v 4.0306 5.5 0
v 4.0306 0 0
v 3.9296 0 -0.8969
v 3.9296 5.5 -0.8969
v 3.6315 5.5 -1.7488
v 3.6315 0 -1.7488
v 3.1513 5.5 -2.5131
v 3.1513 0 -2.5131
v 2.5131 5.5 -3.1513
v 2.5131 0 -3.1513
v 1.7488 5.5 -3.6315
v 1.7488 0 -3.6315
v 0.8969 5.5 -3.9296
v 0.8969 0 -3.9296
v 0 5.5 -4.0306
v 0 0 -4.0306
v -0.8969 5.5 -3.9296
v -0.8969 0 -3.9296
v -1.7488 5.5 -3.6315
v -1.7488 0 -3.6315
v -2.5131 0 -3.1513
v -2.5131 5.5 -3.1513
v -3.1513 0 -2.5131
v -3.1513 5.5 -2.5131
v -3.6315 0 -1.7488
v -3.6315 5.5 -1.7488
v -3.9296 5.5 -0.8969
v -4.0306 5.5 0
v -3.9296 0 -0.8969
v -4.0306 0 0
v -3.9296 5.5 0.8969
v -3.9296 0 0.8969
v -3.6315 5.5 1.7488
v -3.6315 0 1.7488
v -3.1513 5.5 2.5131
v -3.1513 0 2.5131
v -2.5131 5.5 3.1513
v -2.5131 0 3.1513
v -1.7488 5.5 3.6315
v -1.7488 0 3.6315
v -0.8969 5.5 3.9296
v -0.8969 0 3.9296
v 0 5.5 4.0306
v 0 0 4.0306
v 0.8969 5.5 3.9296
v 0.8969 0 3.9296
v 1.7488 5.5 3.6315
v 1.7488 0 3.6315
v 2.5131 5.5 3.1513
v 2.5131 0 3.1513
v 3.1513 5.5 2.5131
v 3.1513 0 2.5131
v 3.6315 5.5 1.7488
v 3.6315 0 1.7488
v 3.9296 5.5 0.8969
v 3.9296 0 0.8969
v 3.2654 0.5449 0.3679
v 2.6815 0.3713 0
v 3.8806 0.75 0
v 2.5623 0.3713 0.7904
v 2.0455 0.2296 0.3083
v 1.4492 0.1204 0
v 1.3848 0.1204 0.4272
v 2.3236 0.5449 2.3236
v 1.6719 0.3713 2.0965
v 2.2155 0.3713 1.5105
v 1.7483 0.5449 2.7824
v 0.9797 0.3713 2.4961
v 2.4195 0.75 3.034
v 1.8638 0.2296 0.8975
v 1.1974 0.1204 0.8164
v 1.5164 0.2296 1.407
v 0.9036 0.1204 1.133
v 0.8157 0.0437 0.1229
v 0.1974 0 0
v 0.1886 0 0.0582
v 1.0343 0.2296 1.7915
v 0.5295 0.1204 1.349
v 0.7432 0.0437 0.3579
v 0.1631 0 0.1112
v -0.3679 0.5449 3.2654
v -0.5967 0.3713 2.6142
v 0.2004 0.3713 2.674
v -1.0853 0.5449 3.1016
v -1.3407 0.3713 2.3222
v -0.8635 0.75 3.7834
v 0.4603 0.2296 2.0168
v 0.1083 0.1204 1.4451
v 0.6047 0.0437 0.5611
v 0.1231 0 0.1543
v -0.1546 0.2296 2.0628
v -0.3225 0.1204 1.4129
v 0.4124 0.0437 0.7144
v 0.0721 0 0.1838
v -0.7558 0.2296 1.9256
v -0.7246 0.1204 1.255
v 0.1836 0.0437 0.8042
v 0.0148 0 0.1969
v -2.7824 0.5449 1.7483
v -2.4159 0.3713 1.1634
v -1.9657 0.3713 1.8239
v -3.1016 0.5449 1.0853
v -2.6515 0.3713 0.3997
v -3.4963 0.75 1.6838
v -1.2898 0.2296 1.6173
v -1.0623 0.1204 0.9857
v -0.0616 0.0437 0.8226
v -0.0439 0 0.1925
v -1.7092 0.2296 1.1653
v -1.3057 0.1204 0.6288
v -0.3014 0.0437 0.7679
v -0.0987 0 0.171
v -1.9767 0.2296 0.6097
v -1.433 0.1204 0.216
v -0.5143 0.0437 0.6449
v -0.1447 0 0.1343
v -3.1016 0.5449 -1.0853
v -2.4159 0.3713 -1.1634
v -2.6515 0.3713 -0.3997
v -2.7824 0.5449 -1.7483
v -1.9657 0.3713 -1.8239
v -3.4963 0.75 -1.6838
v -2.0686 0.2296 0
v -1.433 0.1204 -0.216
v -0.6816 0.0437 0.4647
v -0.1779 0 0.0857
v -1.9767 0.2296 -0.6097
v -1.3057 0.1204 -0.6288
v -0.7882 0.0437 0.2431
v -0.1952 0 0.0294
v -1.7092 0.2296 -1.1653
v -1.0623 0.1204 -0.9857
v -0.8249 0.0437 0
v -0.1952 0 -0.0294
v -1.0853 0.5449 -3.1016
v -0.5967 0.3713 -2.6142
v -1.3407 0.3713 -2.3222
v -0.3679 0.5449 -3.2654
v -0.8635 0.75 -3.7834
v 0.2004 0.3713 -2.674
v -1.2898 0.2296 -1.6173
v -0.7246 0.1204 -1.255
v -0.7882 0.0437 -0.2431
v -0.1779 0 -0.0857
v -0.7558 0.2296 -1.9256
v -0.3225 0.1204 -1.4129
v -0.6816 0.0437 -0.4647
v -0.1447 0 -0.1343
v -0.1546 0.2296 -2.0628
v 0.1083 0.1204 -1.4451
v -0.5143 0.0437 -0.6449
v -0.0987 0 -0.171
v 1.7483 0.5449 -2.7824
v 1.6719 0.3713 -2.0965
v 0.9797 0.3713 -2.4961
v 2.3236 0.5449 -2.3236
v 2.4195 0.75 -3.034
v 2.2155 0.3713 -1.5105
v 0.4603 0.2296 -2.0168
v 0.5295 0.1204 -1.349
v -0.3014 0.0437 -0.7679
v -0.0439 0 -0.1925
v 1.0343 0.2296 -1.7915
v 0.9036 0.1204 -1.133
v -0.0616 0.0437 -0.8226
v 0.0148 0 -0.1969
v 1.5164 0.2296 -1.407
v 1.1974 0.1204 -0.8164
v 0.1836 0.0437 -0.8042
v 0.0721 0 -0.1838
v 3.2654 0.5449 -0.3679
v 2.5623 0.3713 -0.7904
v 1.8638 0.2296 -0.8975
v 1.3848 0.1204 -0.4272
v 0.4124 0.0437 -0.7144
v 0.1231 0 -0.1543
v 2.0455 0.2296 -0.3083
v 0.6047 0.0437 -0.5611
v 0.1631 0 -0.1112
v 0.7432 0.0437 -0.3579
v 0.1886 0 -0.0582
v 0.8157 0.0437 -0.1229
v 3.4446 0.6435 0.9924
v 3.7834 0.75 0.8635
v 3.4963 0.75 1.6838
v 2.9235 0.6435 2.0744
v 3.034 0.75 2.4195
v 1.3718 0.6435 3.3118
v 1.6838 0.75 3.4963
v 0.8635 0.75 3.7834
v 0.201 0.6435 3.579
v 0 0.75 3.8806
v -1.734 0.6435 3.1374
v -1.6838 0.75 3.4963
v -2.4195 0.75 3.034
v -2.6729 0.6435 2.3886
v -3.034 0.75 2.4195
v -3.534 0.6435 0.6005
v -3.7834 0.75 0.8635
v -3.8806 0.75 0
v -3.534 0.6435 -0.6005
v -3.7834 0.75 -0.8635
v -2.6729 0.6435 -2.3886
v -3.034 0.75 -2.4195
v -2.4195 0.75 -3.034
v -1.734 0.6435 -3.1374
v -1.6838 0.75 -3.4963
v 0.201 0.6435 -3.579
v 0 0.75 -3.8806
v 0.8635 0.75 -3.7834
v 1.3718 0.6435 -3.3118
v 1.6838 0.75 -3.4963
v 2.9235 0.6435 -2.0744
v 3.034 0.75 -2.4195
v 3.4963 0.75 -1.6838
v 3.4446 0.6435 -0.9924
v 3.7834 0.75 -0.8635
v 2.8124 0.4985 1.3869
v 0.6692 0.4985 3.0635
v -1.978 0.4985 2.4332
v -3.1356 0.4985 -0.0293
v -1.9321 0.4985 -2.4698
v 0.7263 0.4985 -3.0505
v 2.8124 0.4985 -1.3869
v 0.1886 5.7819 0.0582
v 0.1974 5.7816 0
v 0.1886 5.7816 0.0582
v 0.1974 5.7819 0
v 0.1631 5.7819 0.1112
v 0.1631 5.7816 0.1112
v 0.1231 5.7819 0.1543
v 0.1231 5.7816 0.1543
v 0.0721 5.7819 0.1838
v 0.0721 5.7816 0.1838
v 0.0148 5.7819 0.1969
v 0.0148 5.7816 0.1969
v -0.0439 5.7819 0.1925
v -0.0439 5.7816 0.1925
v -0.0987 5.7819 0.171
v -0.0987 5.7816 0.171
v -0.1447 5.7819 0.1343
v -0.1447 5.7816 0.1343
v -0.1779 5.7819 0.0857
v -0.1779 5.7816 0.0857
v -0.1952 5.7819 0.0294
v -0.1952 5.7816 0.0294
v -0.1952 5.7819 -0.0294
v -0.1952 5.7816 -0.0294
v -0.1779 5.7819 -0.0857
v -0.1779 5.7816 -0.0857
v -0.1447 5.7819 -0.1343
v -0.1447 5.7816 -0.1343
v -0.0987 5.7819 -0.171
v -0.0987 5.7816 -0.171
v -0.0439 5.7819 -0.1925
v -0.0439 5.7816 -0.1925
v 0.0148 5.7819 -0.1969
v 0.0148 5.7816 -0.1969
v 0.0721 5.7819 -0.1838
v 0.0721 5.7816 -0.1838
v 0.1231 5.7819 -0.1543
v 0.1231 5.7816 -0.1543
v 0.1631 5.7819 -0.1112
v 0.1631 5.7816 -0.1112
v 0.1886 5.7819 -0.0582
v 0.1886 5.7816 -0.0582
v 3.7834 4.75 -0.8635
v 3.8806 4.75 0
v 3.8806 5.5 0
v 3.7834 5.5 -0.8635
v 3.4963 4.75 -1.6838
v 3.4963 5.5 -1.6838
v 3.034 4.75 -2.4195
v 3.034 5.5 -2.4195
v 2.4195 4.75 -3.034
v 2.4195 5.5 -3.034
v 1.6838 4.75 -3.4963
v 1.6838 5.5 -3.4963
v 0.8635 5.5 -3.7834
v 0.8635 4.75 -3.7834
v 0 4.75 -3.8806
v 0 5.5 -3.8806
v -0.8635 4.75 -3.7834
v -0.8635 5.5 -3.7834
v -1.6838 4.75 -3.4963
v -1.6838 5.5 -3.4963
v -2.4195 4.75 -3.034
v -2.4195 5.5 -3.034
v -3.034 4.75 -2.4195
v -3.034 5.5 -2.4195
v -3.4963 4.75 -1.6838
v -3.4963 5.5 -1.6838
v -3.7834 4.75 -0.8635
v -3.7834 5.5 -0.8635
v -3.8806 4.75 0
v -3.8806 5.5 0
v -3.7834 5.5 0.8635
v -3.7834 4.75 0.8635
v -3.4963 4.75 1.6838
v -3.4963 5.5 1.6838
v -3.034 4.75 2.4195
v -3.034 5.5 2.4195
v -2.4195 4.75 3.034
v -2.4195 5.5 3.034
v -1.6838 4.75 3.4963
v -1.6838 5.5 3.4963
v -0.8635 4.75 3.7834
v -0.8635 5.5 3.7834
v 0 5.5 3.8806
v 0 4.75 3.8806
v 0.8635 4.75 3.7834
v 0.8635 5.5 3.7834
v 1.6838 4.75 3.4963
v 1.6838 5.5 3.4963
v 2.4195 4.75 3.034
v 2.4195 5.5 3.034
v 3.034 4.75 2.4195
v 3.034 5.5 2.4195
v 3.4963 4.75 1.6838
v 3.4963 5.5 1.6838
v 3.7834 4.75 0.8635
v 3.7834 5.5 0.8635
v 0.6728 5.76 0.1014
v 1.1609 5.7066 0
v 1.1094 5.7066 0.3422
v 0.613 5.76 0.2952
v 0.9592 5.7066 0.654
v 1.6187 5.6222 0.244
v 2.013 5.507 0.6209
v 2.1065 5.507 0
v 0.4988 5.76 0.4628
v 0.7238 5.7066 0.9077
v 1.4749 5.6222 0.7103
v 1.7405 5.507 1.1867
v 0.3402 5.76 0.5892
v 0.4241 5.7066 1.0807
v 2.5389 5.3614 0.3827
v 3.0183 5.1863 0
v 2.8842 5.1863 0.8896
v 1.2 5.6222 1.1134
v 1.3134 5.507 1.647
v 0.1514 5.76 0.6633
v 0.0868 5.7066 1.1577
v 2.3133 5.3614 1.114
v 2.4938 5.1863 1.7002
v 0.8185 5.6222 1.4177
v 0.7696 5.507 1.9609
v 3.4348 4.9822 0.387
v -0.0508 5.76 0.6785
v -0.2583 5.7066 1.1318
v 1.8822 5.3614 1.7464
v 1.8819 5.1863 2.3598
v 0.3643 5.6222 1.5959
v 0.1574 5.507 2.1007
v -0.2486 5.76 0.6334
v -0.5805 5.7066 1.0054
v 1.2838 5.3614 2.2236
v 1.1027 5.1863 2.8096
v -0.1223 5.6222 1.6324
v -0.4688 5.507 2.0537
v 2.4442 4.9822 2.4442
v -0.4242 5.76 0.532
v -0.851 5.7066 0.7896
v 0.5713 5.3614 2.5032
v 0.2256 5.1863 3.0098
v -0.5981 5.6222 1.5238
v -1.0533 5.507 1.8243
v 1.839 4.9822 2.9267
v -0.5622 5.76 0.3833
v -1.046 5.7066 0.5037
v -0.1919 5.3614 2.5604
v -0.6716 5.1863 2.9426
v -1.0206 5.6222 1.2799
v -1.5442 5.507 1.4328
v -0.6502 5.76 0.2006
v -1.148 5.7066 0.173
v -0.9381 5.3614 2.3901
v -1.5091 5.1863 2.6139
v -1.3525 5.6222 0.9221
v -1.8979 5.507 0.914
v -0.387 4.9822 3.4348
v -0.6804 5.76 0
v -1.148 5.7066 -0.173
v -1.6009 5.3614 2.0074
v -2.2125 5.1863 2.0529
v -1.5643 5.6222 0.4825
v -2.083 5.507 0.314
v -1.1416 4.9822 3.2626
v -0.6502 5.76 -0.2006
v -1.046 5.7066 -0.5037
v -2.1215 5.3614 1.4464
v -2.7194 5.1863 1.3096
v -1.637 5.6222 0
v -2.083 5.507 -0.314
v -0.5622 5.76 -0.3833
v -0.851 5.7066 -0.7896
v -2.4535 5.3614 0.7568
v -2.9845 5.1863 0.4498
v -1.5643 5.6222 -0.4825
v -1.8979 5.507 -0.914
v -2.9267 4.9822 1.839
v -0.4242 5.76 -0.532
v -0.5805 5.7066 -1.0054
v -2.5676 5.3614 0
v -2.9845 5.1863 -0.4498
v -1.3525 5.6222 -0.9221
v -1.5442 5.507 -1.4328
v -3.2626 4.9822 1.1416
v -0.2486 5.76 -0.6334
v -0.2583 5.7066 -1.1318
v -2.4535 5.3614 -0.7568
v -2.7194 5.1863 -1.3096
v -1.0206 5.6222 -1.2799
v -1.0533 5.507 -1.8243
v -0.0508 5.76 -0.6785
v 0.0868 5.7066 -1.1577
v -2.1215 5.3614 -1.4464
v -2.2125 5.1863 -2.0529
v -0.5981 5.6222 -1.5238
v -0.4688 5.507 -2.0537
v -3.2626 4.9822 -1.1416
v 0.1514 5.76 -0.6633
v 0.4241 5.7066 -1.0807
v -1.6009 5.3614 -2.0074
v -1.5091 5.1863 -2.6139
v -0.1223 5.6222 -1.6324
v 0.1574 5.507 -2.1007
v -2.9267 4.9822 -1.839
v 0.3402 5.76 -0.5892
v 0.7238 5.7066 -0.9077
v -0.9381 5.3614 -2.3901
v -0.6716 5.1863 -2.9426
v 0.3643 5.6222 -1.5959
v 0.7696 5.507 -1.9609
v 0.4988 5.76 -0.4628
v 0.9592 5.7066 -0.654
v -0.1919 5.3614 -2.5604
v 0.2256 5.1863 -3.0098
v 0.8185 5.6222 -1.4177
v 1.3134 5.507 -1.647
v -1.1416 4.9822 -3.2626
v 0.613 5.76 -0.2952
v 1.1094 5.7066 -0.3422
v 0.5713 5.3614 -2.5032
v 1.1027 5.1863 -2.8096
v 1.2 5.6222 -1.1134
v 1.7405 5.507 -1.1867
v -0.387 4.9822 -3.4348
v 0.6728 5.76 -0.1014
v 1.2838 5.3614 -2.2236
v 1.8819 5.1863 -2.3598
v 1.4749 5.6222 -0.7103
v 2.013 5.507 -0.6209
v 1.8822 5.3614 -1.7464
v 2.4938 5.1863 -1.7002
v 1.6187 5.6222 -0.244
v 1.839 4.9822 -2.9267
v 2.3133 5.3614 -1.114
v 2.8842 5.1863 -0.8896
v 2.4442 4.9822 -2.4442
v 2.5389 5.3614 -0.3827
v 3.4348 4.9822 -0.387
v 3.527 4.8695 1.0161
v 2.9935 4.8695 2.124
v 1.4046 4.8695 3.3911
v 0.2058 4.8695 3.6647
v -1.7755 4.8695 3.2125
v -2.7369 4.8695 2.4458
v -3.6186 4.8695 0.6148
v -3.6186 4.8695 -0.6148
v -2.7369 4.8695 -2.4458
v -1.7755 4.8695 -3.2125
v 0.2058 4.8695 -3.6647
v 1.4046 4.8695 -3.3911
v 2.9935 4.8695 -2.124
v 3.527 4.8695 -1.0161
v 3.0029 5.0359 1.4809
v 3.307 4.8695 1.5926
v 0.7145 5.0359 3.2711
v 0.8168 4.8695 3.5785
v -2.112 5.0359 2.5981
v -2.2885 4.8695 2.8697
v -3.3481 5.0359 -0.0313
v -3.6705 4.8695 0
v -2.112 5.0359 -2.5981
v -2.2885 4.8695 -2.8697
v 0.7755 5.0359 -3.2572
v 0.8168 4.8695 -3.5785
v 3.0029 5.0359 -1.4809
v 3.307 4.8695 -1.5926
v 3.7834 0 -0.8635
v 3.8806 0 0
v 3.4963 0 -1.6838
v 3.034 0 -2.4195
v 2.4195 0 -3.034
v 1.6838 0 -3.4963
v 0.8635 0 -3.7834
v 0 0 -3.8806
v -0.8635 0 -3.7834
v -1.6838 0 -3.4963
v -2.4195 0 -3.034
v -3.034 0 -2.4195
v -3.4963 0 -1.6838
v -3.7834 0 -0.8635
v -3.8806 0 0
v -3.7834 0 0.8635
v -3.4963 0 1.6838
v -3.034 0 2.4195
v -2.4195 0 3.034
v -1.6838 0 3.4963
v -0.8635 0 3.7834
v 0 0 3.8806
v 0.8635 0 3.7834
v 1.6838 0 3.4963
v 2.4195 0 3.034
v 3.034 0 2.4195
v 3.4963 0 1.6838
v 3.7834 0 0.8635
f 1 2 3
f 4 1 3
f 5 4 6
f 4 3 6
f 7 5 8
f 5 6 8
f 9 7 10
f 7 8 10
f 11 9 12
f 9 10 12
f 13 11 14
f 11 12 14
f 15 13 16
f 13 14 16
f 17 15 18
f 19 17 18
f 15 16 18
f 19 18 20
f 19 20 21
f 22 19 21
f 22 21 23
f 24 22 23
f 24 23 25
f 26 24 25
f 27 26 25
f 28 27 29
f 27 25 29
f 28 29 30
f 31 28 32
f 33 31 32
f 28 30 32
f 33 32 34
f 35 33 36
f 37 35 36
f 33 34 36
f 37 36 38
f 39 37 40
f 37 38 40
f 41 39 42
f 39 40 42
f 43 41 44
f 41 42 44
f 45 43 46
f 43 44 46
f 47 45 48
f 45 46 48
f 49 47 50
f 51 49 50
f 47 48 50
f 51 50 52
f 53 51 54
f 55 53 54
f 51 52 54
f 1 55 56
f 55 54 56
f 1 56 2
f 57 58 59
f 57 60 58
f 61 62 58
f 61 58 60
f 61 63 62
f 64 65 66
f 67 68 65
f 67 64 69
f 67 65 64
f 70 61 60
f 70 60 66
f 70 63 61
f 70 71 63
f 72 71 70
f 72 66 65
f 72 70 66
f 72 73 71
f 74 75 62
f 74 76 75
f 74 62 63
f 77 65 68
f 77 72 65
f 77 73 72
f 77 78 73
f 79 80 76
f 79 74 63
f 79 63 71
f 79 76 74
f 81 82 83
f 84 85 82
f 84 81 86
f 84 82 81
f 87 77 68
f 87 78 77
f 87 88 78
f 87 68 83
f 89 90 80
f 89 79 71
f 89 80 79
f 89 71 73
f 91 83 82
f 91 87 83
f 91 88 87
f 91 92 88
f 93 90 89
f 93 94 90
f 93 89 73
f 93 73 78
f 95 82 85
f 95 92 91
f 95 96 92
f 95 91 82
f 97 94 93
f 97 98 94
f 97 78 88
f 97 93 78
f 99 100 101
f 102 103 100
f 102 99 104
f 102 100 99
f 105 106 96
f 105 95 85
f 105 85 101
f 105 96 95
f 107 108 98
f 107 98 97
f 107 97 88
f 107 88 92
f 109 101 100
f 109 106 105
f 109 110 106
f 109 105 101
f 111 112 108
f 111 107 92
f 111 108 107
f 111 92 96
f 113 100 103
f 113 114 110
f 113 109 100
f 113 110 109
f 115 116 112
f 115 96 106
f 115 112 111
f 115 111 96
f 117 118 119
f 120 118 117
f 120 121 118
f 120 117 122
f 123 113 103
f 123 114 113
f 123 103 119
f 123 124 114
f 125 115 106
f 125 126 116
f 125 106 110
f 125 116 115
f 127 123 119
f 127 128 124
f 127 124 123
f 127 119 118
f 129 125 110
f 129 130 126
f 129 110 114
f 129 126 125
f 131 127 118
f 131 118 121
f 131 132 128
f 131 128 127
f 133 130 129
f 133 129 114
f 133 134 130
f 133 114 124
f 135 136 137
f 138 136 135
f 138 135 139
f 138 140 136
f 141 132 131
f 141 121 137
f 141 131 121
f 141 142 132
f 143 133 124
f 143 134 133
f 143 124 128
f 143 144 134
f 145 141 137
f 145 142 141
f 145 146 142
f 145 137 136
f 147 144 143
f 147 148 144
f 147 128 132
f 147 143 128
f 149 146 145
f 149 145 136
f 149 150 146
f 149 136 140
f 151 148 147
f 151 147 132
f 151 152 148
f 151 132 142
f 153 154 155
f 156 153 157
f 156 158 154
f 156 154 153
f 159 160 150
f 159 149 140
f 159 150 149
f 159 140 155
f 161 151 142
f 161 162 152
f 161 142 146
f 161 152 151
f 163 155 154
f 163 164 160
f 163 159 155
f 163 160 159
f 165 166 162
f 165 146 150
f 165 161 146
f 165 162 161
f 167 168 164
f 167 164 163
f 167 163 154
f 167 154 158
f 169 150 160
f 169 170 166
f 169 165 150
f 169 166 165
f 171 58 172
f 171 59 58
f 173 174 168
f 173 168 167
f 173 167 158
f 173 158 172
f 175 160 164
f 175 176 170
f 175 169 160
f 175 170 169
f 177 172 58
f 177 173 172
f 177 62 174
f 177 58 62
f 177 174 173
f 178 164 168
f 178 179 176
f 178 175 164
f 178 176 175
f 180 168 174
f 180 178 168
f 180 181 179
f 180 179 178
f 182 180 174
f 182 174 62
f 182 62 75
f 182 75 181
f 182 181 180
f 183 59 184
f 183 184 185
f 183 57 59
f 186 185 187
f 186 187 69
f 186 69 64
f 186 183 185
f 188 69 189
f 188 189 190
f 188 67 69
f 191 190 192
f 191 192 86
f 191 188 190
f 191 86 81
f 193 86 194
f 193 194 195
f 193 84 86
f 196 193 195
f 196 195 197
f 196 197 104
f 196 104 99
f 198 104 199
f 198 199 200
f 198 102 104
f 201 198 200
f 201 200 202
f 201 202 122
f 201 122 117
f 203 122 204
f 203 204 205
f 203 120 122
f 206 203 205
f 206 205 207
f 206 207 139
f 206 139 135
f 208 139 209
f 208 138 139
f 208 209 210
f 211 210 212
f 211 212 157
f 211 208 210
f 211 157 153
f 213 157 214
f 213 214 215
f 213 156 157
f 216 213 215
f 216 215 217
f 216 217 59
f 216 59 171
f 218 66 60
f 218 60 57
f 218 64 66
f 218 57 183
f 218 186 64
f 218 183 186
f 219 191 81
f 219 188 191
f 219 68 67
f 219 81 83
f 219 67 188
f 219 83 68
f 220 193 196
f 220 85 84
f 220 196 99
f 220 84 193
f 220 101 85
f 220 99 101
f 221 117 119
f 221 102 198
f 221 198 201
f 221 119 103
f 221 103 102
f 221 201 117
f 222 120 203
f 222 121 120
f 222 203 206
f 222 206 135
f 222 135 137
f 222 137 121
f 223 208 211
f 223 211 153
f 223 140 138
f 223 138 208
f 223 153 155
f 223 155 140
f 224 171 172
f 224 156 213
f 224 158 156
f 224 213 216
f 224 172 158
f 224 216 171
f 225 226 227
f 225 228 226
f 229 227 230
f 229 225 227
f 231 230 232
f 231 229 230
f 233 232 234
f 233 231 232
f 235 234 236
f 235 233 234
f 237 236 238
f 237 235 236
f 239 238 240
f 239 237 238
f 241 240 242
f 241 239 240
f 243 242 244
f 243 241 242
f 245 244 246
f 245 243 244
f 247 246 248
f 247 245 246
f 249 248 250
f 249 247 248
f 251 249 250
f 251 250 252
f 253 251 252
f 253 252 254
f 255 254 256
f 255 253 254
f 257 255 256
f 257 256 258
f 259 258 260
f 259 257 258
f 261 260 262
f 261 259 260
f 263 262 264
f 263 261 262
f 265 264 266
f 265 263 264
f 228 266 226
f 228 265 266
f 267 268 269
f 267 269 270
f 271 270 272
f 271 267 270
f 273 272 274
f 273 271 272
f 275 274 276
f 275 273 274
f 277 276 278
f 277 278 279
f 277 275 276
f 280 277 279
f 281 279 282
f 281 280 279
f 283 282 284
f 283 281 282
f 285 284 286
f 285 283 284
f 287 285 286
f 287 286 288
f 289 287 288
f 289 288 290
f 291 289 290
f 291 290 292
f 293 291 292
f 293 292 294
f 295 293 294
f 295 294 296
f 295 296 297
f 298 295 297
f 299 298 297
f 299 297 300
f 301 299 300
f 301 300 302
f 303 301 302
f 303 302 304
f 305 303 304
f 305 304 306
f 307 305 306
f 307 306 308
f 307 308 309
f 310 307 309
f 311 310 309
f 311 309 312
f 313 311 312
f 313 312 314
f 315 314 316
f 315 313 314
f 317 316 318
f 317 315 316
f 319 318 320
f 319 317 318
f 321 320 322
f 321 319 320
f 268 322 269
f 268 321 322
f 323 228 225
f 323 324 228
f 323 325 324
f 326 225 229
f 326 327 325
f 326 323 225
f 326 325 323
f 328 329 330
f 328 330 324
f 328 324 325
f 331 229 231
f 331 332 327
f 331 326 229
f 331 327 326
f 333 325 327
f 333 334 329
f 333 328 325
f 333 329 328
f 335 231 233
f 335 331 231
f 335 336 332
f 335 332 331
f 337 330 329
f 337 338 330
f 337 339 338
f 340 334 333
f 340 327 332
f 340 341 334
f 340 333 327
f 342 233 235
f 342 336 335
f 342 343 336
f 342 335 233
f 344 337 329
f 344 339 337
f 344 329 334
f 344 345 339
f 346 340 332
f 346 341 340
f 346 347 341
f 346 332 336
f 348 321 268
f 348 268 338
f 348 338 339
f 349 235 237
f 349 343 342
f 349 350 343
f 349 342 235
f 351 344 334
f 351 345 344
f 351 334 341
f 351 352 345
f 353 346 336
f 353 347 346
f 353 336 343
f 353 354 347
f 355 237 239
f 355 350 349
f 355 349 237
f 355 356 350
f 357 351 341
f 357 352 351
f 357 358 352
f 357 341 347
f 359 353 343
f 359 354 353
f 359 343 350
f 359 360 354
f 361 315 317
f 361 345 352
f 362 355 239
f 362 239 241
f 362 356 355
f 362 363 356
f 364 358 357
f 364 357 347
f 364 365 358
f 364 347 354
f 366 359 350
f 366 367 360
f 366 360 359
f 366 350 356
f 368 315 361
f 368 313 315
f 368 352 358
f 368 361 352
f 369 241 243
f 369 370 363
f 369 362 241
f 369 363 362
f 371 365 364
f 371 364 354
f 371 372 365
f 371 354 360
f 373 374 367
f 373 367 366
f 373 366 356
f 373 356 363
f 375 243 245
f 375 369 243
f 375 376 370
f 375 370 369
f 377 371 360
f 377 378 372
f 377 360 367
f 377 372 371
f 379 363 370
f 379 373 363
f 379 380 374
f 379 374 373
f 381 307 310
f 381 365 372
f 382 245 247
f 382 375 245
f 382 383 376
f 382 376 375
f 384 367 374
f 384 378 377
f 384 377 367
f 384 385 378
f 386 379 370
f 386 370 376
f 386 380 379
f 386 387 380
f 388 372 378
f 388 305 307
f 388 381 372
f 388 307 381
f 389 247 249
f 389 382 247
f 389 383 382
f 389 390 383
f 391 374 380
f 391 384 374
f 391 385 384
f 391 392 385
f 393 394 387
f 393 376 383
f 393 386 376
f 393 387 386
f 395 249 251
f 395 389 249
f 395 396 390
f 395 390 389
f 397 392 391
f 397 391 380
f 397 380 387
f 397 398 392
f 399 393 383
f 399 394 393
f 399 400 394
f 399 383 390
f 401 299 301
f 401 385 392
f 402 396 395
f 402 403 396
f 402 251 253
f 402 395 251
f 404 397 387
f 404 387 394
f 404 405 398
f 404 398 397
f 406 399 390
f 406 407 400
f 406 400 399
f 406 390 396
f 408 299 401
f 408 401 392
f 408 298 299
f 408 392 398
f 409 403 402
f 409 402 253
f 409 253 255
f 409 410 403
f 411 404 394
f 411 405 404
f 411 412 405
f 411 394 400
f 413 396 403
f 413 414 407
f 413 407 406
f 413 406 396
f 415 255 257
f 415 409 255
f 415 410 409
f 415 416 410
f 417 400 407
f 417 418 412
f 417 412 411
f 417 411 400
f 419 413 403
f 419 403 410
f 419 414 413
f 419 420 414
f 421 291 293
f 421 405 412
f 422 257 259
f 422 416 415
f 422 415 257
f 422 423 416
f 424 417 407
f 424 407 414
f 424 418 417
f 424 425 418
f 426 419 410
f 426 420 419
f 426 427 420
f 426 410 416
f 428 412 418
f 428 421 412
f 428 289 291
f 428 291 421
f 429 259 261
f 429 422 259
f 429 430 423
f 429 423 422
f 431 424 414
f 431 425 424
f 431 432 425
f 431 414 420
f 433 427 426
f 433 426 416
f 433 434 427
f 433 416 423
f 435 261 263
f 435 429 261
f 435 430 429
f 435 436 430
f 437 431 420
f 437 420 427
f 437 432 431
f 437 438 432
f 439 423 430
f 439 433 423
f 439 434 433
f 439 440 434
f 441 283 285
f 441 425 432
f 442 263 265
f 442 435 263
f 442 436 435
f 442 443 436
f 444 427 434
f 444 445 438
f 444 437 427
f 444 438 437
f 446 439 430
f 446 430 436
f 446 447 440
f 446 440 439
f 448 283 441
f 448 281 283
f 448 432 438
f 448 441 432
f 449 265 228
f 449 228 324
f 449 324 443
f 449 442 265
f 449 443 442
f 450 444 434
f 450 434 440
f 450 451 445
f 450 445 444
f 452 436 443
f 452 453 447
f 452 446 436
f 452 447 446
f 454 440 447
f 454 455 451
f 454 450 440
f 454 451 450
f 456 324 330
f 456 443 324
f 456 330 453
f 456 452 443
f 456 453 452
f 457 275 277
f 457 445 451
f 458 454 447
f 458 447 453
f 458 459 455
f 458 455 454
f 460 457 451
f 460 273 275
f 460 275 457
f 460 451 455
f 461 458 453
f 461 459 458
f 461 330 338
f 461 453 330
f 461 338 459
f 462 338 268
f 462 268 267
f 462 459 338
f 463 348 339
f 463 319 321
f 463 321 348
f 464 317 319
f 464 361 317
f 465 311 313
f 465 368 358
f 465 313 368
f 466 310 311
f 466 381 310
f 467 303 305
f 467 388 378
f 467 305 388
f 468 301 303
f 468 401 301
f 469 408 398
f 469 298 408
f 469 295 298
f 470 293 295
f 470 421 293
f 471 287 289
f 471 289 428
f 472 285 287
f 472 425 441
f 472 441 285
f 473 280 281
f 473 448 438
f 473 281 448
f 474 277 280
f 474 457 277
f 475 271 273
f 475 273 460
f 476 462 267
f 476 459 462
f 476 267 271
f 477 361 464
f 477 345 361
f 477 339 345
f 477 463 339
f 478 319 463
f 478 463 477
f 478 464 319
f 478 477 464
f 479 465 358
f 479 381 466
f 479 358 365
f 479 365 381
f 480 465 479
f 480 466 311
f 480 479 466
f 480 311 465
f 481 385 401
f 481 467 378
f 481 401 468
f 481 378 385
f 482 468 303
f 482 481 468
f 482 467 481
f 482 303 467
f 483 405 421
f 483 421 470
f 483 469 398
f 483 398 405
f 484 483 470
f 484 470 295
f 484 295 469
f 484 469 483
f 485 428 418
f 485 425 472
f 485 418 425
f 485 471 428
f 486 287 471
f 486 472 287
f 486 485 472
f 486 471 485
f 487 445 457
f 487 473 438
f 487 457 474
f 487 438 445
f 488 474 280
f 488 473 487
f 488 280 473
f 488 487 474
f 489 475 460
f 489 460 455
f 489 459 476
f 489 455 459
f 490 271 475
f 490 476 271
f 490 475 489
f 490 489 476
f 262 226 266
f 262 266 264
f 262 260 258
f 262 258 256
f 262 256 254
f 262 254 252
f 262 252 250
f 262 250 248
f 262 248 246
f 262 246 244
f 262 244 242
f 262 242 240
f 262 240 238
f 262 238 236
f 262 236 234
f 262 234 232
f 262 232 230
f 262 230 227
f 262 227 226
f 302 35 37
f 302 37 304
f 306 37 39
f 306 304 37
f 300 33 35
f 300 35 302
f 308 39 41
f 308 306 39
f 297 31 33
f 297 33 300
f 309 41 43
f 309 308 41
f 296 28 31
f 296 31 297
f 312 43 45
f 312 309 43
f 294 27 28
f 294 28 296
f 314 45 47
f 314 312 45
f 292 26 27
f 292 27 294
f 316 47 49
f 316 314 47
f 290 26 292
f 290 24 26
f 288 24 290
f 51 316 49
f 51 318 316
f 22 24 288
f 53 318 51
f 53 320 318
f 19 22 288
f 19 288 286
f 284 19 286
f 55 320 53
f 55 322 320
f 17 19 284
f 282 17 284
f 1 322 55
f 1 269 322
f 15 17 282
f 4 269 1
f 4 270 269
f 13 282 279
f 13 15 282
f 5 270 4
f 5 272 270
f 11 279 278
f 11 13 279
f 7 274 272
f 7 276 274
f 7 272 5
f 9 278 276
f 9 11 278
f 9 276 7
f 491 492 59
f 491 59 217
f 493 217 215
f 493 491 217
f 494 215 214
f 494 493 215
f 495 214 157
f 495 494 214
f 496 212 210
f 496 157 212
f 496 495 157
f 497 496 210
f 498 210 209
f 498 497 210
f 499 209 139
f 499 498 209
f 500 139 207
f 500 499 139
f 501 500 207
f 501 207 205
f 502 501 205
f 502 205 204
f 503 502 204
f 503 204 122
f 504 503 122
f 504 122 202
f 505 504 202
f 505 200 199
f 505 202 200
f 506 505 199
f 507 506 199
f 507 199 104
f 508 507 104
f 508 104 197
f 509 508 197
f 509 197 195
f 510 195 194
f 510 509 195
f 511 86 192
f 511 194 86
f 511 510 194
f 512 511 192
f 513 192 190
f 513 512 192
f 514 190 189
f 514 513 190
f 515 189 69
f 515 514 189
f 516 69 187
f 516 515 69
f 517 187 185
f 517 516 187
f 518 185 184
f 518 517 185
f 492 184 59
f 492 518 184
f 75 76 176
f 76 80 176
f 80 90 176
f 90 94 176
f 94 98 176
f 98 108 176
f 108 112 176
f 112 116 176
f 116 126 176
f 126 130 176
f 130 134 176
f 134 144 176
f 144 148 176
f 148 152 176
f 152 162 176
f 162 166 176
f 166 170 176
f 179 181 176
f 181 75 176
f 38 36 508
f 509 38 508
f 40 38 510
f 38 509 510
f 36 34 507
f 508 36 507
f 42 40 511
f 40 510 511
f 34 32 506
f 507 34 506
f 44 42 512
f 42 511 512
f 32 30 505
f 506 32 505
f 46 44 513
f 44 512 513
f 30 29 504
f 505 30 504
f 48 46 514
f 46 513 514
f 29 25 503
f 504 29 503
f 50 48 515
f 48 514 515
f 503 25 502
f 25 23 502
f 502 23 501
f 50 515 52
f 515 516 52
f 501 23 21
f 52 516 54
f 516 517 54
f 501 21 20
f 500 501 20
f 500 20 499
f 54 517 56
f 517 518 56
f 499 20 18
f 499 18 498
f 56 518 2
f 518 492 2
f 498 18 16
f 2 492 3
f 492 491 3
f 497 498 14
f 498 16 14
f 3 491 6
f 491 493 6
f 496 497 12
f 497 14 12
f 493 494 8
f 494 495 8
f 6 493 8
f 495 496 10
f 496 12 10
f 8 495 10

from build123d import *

# Parameters (mm, degrees)
SKETCH1_R                = 4.03065
SKETCH1_R_2              = 3.88065
BOSS_EXTRUDE1_DEPTH      = 5.5
SKETCH3_R                = 0.197408615
BOSS_EXTRUDE2_DEPTH      = 0.28159739
BOSS_EXTRUDE2_DEPTH_BACK = 5.5


with BuildPart() as part:
    # Sketch1 → Boss-Extrude1 (new body)
    with BuildSketch(Plane(origin=(0, 0, 0), x_dir=(1, 0, 0), z_dir=(0, 1, 0))):
        Circle(SKETCH1_R)
        Circle(SKETCH1_R_2, mode=Mode.SUBTRACT)
    extrude(amount=BOSS_EXTRUDE1_DEPTH)

    # Sketch2 → Revolve1 (revolve)
    with BuildSketch(Plane.XY):
        with BuildLine():
            Line((0.197408615, 0), (0.197408615, 5.781917471))
            ThreePointArc((0.197408615, 5.781917471), (2.106547816, 5.506953748), (3.88065, 4.75))
            Line((3.88065, 4.75), (3.88065, 0.75))
            ThreePointArc((3.88065, 0.75), (2.068627273, 0.229644733), (0.197408615, 0))
        make_face()
    revolve(axis=Axis((0, 5.5, 0), (0, -1, 0)))

    # Sketch3 → Boss-Extrude2 (add, two sides)
    with BuildSketch(Plane(origin=(0, 5.5, 0), x_dir=(1, 0, 0), z_dir=(0, 1, 0))) as boss_extrude2_sk:
        Circle(SKETCH3_R)
    extrude(amount=BOSS_EXTRUDE2_DEPTH)
    extrude(boss_extrude2_sk.sketch, amount=-BOSS_EXTRUDE2_DEPTH_BACK)


solid = part.part
